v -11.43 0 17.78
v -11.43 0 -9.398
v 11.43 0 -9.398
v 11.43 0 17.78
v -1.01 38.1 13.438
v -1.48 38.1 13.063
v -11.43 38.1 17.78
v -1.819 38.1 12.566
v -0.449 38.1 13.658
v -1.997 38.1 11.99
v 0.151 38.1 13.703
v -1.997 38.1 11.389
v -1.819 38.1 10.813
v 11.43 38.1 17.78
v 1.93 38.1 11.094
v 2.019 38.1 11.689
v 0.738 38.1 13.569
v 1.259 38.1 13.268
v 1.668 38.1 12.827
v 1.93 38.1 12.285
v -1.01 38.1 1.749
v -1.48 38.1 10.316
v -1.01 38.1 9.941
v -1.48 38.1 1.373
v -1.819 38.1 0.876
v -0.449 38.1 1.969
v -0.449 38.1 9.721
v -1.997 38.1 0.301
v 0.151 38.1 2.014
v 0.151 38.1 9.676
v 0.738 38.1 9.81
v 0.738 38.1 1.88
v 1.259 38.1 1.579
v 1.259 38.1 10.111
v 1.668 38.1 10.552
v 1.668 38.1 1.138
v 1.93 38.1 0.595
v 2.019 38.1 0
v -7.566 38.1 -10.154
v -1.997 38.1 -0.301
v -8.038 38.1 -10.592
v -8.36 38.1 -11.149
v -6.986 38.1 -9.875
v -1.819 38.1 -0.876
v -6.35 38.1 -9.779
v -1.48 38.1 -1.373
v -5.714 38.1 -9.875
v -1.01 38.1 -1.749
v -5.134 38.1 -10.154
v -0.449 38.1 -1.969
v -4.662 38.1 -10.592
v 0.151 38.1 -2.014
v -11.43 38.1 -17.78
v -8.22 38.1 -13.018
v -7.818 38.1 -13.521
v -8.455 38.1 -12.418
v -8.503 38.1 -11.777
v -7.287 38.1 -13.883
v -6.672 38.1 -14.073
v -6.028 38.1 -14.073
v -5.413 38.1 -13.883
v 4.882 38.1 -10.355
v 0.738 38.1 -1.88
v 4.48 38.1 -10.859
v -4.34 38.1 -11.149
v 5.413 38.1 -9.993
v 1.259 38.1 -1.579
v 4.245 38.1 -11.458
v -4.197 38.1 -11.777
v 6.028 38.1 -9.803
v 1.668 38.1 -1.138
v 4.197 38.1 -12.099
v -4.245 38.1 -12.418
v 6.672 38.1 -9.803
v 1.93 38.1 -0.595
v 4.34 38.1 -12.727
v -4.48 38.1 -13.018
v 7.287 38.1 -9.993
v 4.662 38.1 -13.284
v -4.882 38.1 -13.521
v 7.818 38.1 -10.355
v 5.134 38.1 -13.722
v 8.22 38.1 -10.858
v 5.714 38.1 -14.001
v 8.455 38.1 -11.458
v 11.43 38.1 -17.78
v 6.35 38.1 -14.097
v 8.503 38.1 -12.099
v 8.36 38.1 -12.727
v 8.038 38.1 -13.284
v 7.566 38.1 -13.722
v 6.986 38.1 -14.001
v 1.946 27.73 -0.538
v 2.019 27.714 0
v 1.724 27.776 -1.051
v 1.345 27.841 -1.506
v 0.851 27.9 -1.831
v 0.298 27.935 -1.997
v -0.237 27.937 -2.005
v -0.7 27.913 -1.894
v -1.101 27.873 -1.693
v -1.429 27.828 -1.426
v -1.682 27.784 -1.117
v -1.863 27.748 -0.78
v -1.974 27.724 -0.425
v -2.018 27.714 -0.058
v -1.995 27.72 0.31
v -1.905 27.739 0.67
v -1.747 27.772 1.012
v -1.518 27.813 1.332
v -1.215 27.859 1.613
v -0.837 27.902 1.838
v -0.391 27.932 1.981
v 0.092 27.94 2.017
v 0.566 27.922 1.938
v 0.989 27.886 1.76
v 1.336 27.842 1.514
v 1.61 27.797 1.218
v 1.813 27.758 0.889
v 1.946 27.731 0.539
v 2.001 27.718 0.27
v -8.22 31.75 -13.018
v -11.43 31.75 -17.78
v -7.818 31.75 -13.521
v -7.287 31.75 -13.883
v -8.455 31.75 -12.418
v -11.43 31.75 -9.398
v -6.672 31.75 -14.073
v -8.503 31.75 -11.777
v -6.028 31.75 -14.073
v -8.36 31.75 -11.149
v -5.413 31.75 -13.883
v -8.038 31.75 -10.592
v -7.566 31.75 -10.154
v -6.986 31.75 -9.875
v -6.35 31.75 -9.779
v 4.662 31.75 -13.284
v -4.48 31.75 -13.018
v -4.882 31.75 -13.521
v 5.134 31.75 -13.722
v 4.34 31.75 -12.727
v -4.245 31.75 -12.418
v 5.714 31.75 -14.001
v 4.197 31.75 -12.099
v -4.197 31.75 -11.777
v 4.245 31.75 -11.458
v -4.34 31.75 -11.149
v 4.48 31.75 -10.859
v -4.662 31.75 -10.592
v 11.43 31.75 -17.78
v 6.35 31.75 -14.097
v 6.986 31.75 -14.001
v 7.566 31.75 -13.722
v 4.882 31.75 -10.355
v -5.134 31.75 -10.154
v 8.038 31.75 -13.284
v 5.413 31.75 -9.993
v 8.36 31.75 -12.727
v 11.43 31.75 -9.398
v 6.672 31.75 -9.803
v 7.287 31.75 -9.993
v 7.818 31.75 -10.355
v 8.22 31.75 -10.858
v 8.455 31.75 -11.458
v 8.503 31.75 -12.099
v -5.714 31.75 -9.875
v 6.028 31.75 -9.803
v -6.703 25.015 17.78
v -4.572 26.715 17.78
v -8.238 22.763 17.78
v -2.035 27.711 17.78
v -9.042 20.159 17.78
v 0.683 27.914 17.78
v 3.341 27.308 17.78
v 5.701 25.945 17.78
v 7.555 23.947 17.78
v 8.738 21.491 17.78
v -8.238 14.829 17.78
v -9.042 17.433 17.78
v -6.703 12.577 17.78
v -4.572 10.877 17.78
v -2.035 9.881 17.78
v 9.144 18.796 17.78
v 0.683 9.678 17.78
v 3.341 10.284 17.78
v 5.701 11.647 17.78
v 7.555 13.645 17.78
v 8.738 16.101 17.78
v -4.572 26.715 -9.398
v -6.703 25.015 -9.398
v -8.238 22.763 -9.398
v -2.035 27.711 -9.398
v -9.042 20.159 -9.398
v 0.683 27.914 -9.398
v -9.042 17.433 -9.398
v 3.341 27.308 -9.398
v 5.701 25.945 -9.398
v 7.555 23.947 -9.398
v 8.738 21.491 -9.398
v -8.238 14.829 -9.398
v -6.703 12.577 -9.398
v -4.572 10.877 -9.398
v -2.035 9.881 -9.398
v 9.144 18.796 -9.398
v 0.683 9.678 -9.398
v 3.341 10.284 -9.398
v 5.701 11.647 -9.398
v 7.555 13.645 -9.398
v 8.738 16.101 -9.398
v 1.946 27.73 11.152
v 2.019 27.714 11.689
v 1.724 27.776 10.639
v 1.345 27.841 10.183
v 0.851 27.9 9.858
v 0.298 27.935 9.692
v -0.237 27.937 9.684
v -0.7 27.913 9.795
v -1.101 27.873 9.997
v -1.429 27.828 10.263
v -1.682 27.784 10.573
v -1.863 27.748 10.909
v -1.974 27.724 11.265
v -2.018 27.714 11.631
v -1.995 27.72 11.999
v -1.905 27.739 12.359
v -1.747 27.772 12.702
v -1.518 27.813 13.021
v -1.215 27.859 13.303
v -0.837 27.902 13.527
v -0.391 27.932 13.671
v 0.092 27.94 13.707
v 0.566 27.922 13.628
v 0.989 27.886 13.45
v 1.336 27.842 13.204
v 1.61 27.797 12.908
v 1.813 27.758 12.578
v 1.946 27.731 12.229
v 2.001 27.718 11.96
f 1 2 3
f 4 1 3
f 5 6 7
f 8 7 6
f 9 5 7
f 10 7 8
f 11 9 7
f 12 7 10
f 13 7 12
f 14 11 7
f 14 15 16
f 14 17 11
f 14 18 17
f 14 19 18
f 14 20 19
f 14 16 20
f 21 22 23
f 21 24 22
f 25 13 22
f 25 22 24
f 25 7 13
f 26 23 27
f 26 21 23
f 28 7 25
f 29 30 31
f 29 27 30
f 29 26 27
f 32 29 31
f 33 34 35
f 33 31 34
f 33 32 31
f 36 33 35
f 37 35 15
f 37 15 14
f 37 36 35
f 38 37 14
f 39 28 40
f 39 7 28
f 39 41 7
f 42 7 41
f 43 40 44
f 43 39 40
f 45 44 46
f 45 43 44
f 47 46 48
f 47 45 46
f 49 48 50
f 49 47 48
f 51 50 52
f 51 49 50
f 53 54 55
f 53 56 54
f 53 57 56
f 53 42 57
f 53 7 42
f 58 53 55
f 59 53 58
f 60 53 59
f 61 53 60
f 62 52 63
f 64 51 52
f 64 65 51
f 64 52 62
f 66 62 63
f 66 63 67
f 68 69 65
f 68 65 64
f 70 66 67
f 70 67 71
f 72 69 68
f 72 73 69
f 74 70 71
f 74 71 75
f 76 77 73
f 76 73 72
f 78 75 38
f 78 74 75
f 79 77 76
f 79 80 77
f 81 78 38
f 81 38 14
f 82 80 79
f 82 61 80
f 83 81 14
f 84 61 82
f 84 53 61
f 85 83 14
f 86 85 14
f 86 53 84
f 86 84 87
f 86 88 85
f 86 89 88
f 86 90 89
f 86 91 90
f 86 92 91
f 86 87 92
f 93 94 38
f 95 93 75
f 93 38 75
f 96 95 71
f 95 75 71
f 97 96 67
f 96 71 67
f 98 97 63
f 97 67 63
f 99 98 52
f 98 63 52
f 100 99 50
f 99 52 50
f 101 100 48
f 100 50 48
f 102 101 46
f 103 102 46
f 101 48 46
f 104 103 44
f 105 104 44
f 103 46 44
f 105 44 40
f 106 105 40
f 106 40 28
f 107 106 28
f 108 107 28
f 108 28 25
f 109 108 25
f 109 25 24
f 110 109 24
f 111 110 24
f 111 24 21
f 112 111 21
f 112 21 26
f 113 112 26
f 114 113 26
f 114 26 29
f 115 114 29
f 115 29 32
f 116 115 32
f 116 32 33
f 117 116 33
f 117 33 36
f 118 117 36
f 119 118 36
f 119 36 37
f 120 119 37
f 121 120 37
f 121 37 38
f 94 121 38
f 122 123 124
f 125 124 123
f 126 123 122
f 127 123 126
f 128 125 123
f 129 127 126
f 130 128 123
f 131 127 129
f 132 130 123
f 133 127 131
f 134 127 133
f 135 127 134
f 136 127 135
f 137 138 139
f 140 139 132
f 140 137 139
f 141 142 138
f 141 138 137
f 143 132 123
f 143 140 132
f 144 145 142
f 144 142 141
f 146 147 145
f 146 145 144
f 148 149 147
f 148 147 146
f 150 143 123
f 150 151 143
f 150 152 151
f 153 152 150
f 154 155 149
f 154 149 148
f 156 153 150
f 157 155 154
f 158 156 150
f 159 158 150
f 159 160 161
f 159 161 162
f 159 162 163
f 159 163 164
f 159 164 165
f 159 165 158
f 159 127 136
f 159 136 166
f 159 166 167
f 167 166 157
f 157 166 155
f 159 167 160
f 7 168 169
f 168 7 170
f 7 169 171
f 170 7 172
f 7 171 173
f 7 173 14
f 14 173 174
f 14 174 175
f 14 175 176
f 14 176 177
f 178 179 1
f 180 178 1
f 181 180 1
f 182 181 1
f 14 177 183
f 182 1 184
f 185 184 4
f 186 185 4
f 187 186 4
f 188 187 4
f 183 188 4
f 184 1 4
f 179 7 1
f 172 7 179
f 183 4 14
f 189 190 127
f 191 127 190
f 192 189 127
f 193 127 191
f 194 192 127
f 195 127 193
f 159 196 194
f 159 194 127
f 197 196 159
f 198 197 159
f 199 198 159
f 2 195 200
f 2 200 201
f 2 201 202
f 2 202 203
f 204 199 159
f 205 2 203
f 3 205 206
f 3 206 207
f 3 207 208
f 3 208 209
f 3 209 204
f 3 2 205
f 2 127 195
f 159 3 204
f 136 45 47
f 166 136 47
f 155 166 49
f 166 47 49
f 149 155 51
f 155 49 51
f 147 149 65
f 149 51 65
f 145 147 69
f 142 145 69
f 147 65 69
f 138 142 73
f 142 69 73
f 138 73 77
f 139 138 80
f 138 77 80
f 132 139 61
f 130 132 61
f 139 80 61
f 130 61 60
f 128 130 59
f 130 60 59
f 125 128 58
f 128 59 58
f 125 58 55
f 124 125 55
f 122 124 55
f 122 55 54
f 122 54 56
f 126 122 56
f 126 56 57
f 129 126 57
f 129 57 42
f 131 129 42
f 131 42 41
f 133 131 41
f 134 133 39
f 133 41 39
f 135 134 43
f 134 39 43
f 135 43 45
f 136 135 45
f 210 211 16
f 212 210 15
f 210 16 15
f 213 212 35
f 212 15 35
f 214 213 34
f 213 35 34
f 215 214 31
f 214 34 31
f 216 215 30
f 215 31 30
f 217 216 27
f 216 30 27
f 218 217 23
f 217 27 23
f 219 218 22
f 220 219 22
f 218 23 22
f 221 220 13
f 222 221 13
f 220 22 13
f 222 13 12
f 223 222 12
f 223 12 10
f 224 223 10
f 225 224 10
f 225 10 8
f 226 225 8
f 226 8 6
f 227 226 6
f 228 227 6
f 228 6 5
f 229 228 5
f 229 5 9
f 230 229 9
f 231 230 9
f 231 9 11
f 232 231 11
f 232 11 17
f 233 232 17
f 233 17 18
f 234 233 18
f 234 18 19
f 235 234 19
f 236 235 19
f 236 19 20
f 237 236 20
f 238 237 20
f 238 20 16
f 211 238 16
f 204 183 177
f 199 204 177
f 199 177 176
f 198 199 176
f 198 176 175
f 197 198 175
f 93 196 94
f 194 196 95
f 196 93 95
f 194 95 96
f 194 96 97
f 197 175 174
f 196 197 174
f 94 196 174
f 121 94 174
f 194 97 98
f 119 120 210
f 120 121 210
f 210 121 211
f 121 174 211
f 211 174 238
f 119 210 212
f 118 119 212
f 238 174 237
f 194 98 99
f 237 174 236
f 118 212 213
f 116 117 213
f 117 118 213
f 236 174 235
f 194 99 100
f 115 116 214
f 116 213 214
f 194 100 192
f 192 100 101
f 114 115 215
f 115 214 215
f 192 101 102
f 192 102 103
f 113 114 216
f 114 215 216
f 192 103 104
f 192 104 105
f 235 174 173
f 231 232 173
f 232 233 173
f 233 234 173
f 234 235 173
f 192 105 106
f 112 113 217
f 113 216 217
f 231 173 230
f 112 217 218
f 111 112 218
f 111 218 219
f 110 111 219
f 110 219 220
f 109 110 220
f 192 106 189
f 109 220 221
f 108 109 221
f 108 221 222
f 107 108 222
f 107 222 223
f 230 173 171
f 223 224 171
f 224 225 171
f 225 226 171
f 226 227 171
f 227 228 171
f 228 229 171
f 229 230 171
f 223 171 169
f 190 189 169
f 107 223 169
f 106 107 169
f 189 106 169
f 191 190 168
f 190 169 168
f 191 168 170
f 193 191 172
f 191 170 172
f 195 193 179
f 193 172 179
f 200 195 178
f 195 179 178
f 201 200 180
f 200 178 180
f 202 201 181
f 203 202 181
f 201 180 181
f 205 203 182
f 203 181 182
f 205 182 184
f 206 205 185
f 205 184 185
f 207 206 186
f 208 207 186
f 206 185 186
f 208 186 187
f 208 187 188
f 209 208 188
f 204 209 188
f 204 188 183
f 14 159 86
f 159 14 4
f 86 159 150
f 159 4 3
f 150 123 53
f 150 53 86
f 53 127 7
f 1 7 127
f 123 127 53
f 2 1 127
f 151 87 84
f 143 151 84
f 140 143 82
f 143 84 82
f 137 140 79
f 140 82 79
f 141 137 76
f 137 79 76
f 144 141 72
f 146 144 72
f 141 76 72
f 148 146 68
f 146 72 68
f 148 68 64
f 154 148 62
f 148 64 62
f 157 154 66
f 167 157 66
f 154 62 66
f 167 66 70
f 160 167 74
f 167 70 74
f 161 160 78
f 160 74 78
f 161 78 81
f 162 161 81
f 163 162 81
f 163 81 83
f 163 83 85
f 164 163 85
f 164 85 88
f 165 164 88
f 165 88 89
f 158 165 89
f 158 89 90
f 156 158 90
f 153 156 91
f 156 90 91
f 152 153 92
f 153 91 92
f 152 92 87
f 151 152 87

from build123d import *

# Parameters (mm, degrees)
SKETCH1_W                   = 22.86
SKETCH1_H                   = 35.56
BOSS_EXTRUDE1_DEPTH         = 38.1
SKETCH3_W                   = 22.86
SKETCH3_H                   = 8.382
CUT_EXTRUDE2_DEPTH          = 31.75
SKETCH4_R                   = 2.159
CUT_EXTRUDE3_DEPTH          = 6.35
SKETCH6_R                   = 9.144
CUT_EXTRUDE4_DEPTH          = 54.355116906
F_10_32_TAPPED_HOLE1_REACH  = 45.57
F_10_32_TAPPED_HOLE1_BORE_R = 2.0193


with BuildPart() as part:
    # Sketch1 → Boss-Extrude1 (new body)
    with BuildSketch(Plane(origin=(0, 0, 0), x_dir=(1, 0, 0), z_dir=(0, 1, 0))):
        Rectangle(SKETCH1_W, SKETCH1_H)
    extrude(amount=BOSS_EXTRUDE1_DEPTH)

    # Sketch3 → Cut-Extrude2 (cut)
    with BuildSketch(Plane.XZ):
        with Locations((0, -13.589)):
            Rectangle(SKETCH3_W, SKETCH3_H)
    extrude(amount=-CUT_EXTRUDE2_DEPTH, mode=Mode.SUBTRACT)

    # Sketch4 → Cut-Extrude3 (cut)
    with BuildSketch(Plane(origin=(0, 38.1, 0), x_dir=(1, 0, 0), z_dir=(0, 1, 0))):
        with Locations(Location((-6.35, 11.938, 0), (0, 0, 270))):
            Circle(SKETCH4_R)
        with Locations(Location((6.35, 11.938, 0), (0, 0, 90))):
            Circle(SKETCH4_R)
    extrude(amount=-CUT_EXTRUDE3_DEPTH, mode=Mode.SUBTRACT)

    # Sketch6 → Cut-Extrude4 (cut, through all)
    with BuildSketch(Plane.XY.offset(17.78)):
        with Locations((0, 18.796)):
            Circle(SKETCH6_R)
    extrude(amount=-CUT_EXTRUDE4_DEPTH, mode=Mode.SUBTRACT)

    # #10-32 Tapped Hole1 bore → #10-32 Tapped Hole1 (cut, up to next)
    with BuildSketch(Plane(origin=(0, 38.1, 0), x_dir=(1, 0, 0), z_dir=(0, 1, 0)), mode=Mode.PRIVATE) as f_10_32_tapped_hole1_sk1:
        Circle(F_10_32_TAPPED_HOLE1_BORE_R)
    f_10_32_tapped_hole1_tool1 = extrude(f_10_32_tapped_hole1_sk1.sketch, amount=-F_10_32_TAPPED_HOLE1_REACH, mode=Mode.PRIVATE) & part.part
    # #10-32 Tapped Hole1 bore → #10-32 Tapped Hole1 (cut, up to next)
    with BuildSketch(Plane(origin=(0, 38.1, 0), x_dir=(1, 0, 0), z_dir=(0, 1, 0)), mode=Mode.PRIVATE) as f_10_32_tapped_hole1_sk2:
        with Locations((0, -11.689474191)):
            Circle(F_10_32_TAPPED_HOLE1_BORE_R)
    f_10_32_tapped_hole1_tool2 = extrude(f_10_32_tapped_hole1_sk2.sketch, amount=-F_10_32_TAPPED_HOLE1_REACH, mode=Mode.PRIVATE) & part.part
    add(f_10_32_tapped_hole1_tool1.solids().sort_by_distance((0, 38.1, 0))[0], mode=Mode.SUBTRACT)
    add(f_10_32_tapped_hole1_tool2.solids().sort_by_distance((0, 38.1, 11.689474))[0], mode=Mode.SUBTRACT)


solid = part.part
